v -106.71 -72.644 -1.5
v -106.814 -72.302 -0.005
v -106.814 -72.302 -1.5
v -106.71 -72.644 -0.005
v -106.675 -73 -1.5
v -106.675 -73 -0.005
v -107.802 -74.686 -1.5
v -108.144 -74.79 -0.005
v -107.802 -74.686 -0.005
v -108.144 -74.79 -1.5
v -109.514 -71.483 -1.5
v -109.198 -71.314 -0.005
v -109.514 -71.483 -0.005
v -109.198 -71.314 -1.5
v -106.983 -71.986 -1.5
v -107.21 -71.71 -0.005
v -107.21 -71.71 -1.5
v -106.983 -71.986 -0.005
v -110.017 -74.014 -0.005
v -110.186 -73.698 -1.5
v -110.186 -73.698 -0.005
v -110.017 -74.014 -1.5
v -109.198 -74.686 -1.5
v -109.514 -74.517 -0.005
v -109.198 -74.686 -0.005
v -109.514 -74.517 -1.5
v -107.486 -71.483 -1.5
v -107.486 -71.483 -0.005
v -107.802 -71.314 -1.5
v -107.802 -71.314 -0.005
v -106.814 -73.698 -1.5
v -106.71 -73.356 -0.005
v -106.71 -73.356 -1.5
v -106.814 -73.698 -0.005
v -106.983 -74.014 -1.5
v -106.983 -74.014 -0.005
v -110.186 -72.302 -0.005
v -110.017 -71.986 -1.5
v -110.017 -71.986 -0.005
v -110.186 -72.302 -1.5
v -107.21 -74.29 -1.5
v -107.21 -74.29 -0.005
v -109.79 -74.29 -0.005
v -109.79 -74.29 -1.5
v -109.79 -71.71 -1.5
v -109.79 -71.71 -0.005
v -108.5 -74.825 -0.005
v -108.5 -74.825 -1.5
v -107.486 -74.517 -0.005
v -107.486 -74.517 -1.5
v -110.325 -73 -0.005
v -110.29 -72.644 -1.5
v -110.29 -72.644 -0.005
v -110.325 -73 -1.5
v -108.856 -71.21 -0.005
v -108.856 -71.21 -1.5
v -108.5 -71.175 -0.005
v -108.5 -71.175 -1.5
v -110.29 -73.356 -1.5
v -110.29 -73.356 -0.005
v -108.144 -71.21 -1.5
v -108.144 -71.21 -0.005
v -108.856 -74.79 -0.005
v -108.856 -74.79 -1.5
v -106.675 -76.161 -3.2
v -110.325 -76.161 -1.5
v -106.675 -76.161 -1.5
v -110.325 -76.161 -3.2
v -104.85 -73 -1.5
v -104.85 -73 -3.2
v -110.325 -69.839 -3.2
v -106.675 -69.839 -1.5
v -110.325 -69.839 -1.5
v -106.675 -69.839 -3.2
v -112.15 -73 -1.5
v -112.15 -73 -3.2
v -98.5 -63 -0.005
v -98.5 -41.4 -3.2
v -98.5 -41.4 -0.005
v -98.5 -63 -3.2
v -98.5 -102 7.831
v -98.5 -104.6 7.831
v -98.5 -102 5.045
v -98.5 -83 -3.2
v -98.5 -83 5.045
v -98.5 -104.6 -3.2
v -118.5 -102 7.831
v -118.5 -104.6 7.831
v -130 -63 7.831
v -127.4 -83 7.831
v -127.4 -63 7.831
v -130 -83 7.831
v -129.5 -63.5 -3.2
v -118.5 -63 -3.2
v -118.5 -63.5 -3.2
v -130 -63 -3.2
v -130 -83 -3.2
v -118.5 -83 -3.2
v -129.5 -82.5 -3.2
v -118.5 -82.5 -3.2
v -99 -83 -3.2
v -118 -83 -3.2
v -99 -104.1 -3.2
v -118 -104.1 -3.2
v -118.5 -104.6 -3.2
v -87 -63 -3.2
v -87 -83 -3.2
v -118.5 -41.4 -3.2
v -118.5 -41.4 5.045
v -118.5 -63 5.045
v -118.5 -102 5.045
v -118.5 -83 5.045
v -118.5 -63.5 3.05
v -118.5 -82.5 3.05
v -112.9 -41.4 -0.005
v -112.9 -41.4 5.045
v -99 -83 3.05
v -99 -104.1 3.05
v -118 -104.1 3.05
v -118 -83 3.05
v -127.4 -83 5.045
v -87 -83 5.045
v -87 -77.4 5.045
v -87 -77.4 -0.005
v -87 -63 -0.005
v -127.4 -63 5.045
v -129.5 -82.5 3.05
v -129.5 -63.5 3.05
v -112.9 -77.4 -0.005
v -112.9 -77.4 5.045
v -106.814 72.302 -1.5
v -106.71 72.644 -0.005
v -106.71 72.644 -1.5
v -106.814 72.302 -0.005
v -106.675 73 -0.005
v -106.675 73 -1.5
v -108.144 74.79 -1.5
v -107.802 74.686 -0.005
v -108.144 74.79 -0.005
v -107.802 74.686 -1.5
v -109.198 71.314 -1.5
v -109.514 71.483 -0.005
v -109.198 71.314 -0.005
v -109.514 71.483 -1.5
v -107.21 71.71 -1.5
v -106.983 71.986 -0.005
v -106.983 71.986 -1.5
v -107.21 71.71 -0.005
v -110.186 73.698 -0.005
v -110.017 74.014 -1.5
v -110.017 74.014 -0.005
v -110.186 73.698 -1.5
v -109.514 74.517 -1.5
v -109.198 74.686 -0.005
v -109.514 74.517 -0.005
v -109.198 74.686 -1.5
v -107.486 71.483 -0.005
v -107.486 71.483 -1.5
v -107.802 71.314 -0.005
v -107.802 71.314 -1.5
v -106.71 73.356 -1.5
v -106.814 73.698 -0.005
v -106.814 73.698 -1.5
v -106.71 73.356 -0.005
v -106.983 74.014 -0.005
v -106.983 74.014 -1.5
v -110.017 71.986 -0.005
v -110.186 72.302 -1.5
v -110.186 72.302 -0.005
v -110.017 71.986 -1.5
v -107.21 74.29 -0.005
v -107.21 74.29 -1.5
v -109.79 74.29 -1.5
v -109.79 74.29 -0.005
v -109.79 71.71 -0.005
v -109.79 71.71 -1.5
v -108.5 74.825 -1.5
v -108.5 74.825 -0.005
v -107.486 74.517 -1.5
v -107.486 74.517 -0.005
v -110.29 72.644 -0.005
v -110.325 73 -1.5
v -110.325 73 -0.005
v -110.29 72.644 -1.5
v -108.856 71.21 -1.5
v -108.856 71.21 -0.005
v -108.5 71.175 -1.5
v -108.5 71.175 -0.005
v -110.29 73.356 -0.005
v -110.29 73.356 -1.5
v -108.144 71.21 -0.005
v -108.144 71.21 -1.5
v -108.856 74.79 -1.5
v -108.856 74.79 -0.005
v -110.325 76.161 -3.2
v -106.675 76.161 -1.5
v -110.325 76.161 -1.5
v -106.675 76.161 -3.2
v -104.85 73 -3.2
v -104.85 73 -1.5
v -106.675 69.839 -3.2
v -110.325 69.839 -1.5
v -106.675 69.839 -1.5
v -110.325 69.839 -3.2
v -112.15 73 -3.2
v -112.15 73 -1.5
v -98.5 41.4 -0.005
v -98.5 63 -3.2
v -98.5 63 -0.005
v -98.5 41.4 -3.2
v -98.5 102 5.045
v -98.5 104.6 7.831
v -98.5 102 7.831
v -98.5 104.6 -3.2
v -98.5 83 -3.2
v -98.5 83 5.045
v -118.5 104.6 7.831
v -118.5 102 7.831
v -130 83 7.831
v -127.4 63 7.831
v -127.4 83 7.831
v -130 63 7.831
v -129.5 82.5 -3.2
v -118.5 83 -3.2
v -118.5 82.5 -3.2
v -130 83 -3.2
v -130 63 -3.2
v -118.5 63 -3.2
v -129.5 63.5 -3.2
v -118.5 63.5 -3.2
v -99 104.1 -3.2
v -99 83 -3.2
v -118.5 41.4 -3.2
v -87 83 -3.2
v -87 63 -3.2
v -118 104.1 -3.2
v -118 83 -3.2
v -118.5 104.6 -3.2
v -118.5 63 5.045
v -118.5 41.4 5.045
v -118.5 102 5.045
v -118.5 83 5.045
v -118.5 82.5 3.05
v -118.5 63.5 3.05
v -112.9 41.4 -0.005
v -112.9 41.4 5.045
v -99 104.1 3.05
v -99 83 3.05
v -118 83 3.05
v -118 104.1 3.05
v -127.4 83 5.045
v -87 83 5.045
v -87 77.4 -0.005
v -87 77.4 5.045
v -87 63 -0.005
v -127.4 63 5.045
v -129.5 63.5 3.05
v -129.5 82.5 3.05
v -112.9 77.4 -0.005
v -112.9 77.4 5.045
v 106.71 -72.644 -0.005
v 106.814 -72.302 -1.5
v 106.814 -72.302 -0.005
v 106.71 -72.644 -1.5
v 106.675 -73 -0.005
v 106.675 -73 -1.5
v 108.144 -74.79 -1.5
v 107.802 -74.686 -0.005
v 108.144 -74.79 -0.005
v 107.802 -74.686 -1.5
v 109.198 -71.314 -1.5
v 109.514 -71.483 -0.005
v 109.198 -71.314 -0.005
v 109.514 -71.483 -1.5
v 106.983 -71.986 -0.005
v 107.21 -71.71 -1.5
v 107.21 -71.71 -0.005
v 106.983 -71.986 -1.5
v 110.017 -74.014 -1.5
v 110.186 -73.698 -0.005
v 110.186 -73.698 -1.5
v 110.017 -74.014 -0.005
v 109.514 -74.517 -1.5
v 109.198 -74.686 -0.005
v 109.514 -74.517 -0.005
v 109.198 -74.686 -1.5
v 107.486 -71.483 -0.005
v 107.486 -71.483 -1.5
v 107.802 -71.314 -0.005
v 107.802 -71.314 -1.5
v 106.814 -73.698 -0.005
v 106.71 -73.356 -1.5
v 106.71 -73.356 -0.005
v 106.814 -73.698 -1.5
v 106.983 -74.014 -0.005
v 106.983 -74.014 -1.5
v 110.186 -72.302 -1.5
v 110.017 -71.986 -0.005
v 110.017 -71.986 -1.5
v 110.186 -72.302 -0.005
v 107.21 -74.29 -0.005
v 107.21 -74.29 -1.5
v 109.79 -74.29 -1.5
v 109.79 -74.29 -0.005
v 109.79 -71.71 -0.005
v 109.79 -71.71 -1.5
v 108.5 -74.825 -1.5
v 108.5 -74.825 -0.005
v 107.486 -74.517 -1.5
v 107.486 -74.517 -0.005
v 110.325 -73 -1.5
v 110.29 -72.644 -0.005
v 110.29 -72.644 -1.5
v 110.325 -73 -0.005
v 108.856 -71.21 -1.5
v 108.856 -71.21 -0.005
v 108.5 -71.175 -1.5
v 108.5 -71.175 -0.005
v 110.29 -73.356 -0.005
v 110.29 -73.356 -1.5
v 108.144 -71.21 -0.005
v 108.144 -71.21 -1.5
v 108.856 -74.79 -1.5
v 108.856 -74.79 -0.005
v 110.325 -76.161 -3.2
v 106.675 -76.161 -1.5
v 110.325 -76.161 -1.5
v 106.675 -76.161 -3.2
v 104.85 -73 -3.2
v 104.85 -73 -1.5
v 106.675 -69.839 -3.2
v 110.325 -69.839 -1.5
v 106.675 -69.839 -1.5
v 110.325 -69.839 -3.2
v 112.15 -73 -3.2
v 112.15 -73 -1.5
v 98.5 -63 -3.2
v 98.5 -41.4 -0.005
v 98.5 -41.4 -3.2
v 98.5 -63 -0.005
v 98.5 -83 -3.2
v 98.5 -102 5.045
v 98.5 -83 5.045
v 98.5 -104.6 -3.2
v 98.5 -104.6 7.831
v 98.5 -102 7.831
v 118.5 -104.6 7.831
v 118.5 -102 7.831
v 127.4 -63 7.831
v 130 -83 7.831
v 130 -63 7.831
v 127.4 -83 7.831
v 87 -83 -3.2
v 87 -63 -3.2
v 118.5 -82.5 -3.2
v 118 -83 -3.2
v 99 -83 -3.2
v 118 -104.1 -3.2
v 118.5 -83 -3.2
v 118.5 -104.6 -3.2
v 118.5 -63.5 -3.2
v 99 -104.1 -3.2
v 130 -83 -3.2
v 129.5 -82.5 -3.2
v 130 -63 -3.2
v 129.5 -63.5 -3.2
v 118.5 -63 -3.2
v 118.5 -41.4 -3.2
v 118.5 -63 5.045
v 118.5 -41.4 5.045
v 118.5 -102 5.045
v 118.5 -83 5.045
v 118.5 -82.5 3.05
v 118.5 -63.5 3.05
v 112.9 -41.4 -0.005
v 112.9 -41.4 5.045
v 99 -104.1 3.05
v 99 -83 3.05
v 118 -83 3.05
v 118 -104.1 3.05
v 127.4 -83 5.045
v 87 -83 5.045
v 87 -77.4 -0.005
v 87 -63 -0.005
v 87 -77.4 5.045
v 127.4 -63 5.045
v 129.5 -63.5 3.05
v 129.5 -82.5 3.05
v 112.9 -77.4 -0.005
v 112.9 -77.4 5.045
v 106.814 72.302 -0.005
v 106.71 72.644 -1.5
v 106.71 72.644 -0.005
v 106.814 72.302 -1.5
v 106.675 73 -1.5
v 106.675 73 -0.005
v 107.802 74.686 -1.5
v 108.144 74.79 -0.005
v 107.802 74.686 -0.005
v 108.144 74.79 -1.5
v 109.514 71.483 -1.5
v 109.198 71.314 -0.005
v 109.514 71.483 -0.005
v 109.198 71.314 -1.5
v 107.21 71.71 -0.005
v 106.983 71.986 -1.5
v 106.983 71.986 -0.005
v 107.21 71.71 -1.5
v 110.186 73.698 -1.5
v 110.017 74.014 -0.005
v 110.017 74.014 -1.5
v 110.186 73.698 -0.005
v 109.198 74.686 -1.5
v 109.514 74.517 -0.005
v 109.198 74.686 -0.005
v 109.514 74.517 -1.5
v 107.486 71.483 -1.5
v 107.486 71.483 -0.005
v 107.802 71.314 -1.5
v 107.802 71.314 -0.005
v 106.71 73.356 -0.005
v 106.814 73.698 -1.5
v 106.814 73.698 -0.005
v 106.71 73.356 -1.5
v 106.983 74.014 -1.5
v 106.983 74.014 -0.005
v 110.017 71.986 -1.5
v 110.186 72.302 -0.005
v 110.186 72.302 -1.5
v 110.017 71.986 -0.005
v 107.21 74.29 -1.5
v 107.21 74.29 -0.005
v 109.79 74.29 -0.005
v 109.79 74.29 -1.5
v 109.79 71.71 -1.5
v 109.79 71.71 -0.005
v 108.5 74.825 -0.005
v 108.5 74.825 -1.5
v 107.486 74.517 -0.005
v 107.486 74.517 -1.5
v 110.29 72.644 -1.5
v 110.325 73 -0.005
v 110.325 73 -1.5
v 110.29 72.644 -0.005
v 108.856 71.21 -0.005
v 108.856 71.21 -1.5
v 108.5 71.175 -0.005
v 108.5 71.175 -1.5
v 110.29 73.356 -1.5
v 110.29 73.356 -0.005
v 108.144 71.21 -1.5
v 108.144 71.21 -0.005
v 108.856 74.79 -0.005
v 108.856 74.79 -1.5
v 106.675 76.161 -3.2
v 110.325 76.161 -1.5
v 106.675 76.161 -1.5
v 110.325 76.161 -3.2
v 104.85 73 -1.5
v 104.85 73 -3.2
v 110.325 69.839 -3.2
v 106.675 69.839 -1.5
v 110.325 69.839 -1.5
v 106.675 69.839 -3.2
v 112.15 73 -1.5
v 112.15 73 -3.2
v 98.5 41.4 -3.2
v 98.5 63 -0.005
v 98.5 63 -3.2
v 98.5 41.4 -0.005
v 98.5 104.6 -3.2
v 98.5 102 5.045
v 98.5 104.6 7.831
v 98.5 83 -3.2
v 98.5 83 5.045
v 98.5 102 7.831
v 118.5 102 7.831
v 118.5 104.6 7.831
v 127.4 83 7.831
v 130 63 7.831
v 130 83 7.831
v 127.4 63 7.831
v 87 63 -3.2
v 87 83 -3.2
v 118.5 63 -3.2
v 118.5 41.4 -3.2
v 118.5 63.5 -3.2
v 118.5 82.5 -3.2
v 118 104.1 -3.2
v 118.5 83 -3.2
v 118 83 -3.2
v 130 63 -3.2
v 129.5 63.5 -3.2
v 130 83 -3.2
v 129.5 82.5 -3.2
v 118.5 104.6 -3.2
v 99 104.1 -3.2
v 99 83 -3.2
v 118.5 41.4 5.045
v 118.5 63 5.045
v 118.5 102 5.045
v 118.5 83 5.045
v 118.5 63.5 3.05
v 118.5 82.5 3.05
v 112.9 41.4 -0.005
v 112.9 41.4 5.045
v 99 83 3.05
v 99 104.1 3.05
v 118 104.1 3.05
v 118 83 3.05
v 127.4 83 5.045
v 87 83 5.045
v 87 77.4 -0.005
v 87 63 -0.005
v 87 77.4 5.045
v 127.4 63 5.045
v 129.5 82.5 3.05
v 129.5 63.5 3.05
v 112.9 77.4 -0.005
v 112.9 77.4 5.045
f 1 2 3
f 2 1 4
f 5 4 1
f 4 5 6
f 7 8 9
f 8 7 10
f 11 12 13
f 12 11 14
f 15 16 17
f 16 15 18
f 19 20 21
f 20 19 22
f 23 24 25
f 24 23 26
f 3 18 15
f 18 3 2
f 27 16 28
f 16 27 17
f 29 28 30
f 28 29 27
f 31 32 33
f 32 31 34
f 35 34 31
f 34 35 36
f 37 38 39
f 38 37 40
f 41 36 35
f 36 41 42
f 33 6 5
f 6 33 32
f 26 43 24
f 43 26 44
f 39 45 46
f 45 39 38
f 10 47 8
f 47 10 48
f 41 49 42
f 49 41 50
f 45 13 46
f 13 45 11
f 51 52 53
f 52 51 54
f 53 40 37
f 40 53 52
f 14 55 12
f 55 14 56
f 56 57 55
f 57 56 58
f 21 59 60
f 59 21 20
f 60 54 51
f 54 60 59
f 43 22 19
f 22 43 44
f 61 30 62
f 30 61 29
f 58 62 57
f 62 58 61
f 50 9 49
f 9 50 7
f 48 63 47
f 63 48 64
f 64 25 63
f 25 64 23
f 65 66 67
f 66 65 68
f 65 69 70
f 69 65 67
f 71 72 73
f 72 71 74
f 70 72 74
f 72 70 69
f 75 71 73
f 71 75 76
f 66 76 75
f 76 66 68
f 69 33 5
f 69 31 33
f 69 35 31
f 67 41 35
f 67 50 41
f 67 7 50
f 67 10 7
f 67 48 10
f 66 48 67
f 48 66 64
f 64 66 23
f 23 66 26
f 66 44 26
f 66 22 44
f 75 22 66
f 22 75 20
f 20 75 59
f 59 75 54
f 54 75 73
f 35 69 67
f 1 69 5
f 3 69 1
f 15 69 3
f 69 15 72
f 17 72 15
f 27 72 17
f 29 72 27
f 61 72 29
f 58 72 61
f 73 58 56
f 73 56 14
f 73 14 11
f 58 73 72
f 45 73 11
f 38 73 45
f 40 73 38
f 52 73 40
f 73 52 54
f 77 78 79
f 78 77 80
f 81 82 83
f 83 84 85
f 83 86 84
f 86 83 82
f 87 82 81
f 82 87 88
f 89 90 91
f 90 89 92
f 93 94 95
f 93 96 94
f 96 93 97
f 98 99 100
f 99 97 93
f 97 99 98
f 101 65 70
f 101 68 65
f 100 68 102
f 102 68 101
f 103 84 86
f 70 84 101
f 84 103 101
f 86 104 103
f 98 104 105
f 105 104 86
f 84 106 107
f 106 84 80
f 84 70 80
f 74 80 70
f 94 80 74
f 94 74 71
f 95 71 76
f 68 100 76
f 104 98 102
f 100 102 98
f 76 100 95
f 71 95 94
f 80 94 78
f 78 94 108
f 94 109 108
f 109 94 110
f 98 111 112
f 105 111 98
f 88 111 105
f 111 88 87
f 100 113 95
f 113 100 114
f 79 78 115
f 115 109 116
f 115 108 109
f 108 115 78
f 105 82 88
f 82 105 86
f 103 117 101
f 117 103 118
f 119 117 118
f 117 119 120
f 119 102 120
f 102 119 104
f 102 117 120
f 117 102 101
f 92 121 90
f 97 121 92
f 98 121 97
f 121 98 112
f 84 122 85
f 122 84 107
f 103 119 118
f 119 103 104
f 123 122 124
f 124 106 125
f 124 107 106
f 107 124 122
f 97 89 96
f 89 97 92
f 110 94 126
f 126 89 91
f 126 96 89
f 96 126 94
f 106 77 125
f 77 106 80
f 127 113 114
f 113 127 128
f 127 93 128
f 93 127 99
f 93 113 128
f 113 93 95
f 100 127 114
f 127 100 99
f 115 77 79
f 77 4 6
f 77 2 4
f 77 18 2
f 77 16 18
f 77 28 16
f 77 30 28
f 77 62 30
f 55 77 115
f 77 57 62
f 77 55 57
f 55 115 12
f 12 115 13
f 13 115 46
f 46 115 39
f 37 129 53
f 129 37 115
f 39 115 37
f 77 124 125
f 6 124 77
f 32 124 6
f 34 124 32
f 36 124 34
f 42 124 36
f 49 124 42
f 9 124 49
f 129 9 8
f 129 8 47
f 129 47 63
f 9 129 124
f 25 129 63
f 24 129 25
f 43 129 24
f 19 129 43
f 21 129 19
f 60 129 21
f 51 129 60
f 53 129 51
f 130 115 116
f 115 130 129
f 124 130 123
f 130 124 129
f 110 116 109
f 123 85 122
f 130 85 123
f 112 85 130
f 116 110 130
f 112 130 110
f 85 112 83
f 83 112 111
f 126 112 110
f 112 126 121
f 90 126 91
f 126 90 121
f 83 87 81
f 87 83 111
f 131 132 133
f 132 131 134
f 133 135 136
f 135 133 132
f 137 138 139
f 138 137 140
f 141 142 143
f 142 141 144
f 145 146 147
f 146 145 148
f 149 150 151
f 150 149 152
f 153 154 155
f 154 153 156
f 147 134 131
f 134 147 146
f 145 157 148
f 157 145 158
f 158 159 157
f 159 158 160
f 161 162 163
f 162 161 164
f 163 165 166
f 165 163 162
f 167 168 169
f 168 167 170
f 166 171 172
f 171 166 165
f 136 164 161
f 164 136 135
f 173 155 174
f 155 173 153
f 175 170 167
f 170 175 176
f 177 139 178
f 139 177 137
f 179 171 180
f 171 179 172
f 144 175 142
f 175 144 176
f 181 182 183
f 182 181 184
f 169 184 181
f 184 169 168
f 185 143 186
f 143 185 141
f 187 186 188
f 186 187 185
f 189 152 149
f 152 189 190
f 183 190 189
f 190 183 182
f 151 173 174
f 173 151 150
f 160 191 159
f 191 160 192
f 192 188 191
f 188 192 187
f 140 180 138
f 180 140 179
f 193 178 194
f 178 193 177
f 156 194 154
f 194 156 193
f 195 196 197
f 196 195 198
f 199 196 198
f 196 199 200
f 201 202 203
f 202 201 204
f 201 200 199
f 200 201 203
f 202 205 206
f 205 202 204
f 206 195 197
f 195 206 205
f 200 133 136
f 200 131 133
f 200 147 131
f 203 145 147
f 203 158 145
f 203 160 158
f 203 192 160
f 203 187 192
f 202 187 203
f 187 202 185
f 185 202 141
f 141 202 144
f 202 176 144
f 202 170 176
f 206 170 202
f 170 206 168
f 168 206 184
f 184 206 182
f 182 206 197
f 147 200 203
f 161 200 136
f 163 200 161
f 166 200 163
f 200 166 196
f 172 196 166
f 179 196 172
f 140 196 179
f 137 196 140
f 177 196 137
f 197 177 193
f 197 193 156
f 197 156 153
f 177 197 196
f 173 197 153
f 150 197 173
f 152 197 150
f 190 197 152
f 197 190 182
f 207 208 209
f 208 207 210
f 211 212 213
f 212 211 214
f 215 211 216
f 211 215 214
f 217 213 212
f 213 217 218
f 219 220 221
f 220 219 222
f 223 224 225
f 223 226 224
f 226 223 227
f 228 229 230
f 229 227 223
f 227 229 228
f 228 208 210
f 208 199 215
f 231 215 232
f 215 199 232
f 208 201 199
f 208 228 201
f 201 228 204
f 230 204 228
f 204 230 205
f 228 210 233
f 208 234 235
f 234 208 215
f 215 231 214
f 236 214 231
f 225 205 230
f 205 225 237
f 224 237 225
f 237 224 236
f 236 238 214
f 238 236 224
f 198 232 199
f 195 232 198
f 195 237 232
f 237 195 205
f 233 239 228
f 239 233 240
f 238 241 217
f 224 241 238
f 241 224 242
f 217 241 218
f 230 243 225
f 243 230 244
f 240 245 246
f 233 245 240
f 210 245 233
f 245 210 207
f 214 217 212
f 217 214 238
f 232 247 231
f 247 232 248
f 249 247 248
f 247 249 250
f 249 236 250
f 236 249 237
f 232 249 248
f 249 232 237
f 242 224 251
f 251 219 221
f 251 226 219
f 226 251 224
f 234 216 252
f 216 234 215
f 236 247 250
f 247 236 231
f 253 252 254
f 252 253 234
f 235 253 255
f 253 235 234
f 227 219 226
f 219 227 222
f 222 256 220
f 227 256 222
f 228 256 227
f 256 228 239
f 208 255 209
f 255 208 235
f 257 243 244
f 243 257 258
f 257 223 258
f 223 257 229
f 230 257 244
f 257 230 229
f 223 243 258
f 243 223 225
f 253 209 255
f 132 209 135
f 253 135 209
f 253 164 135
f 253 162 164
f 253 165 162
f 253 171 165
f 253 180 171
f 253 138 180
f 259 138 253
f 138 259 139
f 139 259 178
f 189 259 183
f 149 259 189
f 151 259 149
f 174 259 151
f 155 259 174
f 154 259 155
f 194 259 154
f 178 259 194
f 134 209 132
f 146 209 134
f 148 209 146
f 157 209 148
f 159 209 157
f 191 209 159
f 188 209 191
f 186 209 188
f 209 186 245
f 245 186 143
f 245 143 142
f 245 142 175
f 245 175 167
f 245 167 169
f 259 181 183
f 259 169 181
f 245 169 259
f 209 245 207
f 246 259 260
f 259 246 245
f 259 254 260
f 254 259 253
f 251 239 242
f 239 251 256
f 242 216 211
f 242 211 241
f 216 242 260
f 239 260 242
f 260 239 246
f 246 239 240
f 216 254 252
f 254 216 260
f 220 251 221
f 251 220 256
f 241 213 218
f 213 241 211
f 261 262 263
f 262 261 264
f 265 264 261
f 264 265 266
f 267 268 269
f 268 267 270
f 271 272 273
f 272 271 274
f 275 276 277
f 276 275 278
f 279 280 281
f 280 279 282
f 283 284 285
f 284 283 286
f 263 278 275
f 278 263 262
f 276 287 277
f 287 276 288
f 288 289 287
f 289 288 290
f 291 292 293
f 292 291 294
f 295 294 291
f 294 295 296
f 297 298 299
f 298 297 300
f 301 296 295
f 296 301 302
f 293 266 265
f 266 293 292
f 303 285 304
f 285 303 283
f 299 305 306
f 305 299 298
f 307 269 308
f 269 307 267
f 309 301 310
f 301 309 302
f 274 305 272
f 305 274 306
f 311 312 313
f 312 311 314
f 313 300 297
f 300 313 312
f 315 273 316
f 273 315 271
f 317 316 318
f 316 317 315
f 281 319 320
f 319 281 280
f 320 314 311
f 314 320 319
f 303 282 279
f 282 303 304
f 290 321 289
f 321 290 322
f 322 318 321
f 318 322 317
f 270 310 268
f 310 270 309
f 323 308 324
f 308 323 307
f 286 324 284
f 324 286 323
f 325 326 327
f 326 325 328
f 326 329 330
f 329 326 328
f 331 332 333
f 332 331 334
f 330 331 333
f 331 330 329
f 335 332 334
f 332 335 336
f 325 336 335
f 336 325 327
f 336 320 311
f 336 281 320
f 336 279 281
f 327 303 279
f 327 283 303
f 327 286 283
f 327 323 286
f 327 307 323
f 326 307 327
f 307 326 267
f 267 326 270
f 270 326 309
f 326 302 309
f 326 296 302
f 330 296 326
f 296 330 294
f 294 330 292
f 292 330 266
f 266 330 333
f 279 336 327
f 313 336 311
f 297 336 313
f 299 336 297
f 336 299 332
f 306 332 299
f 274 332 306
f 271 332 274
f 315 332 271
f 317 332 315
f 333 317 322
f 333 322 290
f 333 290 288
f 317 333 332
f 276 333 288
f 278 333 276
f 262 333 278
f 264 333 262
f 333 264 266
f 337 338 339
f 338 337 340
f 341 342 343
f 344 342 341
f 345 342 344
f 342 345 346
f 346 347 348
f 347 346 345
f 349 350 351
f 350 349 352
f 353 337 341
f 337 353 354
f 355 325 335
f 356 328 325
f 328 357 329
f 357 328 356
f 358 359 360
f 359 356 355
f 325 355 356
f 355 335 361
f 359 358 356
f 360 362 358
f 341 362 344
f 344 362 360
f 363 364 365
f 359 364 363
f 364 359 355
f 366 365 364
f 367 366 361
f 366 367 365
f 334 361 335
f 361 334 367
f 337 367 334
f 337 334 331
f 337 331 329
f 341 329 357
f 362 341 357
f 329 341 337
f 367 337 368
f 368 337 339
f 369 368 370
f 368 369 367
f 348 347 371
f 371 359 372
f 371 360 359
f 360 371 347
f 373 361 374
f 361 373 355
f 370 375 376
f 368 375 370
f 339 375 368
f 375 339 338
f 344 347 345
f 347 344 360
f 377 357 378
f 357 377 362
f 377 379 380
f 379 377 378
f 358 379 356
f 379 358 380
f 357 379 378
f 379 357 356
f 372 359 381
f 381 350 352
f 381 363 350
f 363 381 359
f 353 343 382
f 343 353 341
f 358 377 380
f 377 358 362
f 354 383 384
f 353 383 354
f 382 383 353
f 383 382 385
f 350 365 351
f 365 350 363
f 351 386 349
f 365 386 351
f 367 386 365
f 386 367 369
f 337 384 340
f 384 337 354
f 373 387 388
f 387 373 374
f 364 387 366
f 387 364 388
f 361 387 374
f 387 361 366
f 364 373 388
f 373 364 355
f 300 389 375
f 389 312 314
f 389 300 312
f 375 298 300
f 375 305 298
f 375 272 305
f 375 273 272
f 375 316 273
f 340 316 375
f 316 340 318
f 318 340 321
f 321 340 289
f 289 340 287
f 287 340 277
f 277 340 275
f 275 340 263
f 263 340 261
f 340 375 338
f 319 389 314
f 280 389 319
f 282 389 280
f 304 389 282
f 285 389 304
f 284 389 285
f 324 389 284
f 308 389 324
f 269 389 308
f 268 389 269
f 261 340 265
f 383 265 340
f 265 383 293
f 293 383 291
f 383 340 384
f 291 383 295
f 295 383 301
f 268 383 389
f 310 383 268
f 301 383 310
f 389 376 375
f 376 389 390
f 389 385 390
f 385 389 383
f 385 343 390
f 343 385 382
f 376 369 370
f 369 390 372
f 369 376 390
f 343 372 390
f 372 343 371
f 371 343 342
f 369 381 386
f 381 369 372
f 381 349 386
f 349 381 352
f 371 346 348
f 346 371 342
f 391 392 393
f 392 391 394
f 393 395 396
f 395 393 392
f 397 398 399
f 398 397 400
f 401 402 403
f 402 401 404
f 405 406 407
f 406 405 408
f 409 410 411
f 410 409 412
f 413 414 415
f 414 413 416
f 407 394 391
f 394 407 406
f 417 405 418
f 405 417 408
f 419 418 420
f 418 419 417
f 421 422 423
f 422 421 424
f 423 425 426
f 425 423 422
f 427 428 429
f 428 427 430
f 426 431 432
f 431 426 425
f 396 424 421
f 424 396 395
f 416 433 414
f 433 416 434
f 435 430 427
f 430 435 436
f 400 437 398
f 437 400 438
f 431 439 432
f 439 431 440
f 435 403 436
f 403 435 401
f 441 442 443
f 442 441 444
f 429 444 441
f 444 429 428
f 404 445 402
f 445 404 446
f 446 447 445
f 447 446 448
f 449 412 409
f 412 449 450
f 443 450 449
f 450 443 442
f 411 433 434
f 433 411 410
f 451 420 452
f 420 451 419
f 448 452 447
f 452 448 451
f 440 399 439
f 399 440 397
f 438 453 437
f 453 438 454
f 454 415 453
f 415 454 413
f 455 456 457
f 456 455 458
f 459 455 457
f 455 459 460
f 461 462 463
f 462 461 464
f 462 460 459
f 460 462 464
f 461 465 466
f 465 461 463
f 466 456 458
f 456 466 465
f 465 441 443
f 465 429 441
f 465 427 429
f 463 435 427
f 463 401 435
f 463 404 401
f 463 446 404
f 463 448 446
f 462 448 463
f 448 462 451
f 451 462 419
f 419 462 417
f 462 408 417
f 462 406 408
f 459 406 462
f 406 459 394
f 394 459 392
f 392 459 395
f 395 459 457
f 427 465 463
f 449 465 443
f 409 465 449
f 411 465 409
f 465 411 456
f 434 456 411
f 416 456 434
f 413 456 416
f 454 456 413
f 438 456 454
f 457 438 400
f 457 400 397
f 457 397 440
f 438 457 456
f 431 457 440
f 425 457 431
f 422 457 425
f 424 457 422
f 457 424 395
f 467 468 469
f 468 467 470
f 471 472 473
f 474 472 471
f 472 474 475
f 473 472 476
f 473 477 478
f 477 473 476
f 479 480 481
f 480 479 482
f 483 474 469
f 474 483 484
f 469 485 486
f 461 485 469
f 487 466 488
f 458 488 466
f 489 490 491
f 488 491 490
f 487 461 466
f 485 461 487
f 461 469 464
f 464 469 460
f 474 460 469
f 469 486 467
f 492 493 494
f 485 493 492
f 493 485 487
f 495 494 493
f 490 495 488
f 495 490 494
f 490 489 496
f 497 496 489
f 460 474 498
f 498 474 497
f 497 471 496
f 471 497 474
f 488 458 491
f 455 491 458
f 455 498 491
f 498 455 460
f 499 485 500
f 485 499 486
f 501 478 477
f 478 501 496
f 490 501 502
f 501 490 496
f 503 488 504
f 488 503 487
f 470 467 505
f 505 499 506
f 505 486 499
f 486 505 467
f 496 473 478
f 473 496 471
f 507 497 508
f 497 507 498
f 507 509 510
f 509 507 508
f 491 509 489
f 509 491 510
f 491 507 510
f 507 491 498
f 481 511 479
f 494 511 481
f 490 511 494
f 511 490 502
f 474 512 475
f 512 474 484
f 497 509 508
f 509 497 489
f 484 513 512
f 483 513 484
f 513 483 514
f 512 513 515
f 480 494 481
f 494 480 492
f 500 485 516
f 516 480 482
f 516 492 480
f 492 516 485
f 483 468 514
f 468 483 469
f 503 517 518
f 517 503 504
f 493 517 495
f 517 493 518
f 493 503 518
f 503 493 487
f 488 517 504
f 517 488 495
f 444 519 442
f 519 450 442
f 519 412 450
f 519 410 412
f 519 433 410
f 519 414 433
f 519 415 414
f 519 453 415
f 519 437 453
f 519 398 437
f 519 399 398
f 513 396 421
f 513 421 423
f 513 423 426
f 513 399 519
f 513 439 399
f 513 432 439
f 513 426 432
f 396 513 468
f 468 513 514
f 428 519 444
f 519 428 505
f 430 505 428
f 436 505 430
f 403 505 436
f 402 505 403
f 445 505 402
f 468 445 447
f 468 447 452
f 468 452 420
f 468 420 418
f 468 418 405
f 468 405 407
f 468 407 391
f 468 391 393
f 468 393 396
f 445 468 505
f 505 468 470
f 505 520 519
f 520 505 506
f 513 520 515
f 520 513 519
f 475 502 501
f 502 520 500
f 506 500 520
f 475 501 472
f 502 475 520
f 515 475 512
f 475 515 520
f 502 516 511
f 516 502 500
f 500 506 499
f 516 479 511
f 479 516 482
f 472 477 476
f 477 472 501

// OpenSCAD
/* [Options] */

// Part
part=0; // [0:Preview, 1:Left, 2:Right]

// Support thickness
support = 1; // 0 = no support, 0.5 = easy to remove

/* [print bed dimensions] */

// Print bed size, side-to-side
bedX = 225; // Replicator 225, FlashForge 230
// Print bed size, front-to-back
bedY = 154; // Replicator 154, FlashForge 154
// Print bed thickness
bedZ = 5.25; // Replicator 5.25 FlashForge 9
// From edge to center of corner screw
screwInset = 4; // Replicator 4, FlashForge 4
// Diameter of screw
screwD = 2.85;
screwR = screwD/2;
// Diameter of nut
nutD = 6.5;
nutR = nutD/2;

echo(str("Bed dimensions [",bedX,", ", bedY,", ",bedZ,"]"));

/* [Glass plate dimensions] */
// Long edge
glassX = 254; // 10 in = 254 mm
// Short edge 
glassY = 203.2; // 8.5 in = 203.2 mm
// Thickness
glassZ = 2.38125; // 3/32 in = 2.38 mm

// Hidden stuff (from Customizer)

// clip above glass
clipLen = 0*0;
clipHeight = 0*0;

// clip thickness beyond edge of glass
cornerThick = 3*1;
cornerThin=1.5*1;
cornerHeight = cornerThick+bedZ+glassZ+clipHeight;

g = 0.01*1;
// Clearance between parts
gap=0.4*1;

if (part==0) {
	%printerStuff();
	for (xm=[0:1])
		mirror([xm,0,0]) 
		for (ym=[0:1]) 
			mirror([0,ym,0]) 
				color("blue") cornerClip();
	}
if (part==1) translate([bedX/2,bedY/2,0]) cornerClip();
if (part==2) mirror([1,0,0]) translate([bedX/2,bedY/2,0]) cornerClip();

//magnetHolder();

module magnetHolder() {
	difference() {
		union() {
			cube([12,75,3],center=true);
			translate([0,75/2,0]) cylinder(h=3, r=4+2, center=true);
		}
	translate([0,75/2,-.5]) cylinder(h=4, r=4+.4);
	}
}

module printerStuff() {
	color("grey") translate([0,0,bedZ/2]) cube([bedX+2*gap,bedY+2*gap,bedZ+g], center=true);
	translate([0,0,bedZ+glassZ/2]) cube([glassX+2*gap,glassY+2*gap,glassZ+g+gap], center=true);
	translate([0,0,bedZ+glassZ]) cube([glassX-2*clipLen,glassY-2*clipLen+g,glassZ], center=true);
	
	screw();
	mirror([1,0,0]) screw();
	mirror([0,1,0]) screw();
	mirror([0,1,0]) mirror([1,0,0]) screw();
	}

module screw() {
	color("silver") translate([-bedX/2+screwInset,-bedY/2+screwInset,-5]) {
		cylinder(r=screwD/2+gap, h=10, $fn=32);
		translate([0,0,0-cornerThin]) cylinder(r=nutD/2+gap, h=5, $fn=6);
		}
	}

module cornerClip() {
	difference() {
		clip();
		printerStuff();
		}
	}

module clip() {
	lenY = glassY/2-bedY/2+screwInset+cornerThick;
	lenX = glassX/2-bedX/2+screwInset+cornerThick;
	translate([-bedX/2+screwInset,-bedY/2+screwInset,-cornerThick+cornerHeight/2]) {
		difference() {
			cube([20,2*lenY,cornerHeight+gap], center=true);
		translate([-20+support,-2*lenY+support,-(cornerHeight+gap)]/2) 
			cube([20-support,lenY-10-support/2,bedZ+1]);
		}
		difference() {
			cube([2*lenX,20,cornerHeight+gap], center=true);
		translate([-2*lenX+support,-20+support,-(cornerHeight+gap)]/2) 
			cube([lenX-10-support/2,20-support,bedZ+1]);
		}
	}
	}
